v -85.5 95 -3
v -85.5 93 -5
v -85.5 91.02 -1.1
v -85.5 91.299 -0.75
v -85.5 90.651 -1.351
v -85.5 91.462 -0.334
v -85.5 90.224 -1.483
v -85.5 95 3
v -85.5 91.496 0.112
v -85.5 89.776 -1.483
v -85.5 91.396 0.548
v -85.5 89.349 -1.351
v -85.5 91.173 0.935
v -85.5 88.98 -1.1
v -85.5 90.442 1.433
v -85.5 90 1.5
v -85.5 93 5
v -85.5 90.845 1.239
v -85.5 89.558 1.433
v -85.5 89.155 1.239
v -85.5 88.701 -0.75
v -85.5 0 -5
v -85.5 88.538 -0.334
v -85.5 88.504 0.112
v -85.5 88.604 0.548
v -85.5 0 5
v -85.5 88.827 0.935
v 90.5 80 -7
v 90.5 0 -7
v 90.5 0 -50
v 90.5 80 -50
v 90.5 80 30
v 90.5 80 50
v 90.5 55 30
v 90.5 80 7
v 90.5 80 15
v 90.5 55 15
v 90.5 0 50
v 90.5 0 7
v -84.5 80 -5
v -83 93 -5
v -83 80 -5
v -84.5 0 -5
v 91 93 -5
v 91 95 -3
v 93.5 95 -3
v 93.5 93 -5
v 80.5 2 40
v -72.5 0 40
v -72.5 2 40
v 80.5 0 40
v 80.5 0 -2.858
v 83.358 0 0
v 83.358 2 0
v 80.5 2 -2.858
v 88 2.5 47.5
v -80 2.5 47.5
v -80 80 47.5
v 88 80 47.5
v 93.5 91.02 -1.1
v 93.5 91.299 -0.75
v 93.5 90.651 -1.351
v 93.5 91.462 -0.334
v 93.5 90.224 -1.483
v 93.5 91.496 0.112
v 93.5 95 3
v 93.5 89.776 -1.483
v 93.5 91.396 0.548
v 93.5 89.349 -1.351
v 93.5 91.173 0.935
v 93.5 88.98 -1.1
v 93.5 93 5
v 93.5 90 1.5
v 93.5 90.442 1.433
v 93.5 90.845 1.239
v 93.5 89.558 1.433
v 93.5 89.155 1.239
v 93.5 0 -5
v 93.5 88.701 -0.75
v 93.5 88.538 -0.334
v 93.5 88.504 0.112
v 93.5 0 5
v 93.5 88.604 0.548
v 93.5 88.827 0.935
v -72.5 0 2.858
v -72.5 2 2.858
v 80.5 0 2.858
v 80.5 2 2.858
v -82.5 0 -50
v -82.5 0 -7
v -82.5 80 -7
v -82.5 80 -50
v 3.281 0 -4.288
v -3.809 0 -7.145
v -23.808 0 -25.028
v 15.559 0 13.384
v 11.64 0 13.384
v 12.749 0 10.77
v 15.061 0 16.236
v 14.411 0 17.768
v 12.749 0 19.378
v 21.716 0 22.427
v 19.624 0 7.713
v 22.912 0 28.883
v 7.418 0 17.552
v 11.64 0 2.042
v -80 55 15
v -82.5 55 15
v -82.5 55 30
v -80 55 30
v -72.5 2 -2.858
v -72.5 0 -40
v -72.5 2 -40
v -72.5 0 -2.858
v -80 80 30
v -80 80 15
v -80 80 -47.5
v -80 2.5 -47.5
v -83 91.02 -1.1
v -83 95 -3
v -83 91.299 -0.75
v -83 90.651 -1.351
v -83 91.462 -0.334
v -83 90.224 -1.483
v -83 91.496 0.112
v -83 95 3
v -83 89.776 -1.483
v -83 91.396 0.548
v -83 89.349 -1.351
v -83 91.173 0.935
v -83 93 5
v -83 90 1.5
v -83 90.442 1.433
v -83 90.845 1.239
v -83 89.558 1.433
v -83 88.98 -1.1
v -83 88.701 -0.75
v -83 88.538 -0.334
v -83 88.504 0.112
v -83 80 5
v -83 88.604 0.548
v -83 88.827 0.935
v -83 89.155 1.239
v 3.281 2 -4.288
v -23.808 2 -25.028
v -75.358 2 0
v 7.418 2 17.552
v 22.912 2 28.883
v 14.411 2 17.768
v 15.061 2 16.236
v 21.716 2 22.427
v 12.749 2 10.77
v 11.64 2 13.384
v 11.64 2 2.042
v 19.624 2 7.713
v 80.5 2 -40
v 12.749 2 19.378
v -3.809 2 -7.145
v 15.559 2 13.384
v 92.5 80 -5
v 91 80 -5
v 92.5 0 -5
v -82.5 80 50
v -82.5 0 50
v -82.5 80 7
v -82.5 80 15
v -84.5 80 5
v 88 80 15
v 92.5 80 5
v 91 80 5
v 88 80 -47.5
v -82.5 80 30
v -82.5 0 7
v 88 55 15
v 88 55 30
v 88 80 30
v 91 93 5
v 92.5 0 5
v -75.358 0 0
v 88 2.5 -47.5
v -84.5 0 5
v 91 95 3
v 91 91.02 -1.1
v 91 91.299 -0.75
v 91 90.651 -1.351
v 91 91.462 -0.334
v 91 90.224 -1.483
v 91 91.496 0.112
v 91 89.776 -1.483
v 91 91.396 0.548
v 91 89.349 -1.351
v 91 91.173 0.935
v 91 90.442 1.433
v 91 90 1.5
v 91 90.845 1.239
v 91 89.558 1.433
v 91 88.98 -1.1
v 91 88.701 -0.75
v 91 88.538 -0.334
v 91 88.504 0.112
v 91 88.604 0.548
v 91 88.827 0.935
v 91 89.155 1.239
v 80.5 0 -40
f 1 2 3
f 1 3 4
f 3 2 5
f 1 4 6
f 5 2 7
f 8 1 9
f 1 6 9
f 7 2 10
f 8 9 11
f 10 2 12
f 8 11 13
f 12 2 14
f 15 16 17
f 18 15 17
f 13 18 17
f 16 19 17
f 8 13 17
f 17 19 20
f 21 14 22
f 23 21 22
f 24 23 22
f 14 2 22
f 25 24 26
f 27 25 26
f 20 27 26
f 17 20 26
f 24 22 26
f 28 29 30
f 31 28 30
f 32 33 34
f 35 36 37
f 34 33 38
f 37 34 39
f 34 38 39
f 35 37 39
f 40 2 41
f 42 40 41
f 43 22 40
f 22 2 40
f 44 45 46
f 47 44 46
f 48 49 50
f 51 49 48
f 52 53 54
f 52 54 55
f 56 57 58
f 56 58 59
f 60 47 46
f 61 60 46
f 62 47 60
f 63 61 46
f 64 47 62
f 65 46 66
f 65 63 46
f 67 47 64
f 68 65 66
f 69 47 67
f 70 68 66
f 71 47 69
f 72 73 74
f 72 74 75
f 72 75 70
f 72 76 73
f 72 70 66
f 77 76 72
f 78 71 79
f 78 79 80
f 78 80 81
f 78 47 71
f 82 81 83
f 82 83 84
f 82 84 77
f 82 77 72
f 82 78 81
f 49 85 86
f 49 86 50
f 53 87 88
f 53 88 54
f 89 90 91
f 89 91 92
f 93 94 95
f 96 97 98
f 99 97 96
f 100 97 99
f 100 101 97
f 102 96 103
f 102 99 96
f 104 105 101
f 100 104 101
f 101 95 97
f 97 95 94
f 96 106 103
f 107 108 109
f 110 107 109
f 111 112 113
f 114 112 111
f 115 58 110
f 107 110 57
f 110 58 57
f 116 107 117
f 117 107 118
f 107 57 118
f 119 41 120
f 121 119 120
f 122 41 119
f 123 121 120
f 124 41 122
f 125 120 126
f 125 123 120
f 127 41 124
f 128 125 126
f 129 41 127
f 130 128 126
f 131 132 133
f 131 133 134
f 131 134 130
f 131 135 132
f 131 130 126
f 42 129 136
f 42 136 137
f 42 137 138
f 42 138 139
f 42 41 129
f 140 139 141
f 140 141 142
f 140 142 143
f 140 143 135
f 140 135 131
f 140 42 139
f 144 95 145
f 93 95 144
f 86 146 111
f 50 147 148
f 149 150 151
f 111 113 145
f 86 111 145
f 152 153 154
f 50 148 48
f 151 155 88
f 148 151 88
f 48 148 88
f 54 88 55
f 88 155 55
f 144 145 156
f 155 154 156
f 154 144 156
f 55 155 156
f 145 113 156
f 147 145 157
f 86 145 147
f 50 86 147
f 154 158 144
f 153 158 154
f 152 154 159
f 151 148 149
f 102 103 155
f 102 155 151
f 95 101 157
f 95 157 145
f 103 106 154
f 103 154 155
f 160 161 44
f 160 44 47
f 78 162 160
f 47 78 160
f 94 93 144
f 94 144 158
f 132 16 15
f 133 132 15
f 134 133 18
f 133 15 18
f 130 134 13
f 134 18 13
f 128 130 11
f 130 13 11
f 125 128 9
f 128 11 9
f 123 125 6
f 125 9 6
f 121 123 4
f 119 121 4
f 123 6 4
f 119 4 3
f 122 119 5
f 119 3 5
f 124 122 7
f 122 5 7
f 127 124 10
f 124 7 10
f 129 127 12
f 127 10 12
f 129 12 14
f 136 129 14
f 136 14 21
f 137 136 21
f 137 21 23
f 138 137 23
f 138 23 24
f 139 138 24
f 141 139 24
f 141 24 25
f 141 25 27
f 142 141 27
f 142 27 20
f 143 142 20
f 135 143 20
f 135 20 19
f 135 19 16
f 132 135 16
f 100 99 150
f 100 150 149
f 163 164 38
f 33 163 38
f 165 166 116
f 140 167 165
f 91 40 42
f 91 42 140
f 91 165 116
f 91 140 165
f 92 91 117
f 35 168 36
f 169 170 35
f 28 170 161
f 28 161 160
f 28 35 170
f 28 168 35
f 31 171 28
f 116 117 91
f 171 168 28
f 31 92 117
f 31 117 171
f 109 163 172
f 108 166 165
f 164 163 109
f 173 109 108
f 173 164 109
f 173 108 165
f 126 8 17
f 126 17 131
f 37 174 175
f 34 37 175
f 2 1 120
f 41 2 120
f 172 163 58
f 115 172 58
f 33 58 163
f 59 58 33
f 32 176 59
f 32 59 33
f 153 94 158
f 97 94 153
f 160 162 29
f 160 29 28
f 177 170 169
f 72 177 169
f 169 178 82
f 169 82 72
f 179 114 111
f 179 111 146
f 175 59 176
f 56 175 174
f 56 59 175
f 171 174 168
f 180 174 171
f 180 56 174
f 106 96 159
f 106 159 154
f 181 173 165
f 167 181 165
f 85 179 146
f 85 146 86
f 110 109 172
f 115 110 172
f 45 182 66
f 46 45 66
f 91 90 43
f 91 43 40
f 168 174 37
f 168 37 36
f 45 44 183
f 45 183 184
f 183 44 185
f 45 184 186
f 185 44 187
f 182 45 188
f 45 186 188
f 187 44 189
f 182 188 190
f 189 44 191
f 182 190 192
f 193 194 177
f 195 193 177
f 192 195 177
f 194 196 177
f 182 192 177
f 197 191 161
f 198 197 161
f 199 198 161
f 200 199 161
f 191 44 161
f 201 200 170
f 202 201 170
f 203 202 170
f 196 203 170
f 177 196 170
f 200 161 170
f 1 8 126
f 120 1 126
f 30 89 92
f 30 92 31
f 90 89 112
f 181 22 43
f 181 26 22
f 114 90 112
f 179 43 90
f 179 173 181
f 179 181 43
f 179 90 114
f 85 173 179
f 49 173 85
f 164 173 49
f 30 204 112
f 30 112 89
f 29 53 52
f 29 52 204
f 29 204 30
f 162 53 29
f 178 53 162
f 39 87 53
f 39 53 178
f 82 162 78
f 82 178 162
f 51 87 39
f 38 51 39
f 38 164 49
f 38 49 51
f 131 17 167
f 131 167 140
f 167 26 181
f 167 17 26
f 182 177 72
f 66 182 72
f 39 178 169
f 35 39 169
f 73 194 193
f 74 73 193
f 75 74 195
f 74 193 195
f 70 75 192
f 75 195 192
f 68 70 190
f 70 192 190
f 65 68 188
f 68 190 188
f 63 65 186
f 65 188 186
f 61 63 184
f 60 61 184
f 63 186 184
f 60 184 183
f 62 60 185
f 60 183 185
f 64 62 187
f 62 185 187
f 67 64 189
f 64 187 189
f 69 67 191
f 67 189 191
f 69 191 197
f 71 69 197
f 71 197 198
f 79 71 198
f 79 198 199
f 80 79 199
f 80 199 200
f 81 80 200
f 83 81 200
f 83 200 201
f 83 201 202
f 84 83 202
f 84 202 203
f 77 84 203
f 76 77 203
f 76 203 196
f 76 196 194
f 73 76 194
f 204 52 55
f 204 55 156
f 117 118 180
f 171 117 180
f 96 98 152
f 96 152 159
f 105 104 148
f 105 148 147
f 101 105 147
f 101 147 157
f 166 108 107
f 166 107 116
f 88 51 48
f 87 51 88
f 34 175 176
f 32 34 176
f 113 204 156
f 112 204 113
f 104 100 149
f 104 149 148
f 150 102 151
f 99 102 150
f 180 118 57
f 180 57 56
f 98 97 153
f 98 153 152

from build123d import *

# Parameters (mm, degrees)
SKETCH1_W           = 173
SKETCH1_H           = 100
BOSS_EXTRUDE1_DEPTH = 80
SHELL2_T            = -2.5
SKETCH3_W           = 3
SKETCH3_H           = 10
BOSS_EXTRUDE2_DEPTH = 95
CHAMFER1_SIZE       = 2
MOVE_FACE1_BY       = 0.5
MOVE_FACE2_BY       = 0.5
SKETCH4_R           = 1.5
CUT_EXTRUDE1_DEPTH  = 209.724699066
CUT_EXTRUDE3_DEPTH  = 2
SKETCH6_W           = 15
SKETCH6_H           = 25
CUT_EXTRUDE4_DEPTH  = 207.157706623


# Read off the part's stored shape, not the designer's step: Cut-Extrude3
with BuildPart() as part:
    # Sketch1 → Boss-Extrude1 (new body)
    with BuildSketch(Plane(origin=(0, 0, 0), x_dir=(1, 0, 0), z_dir=(0, 1, 0))):
        with Locations((4, 0)):
            Rectangle(SKETCH1_W, SKETCH1_H)
    extrude(amount=BOSS_EXTRUDE1_DEPTH)

    # Shell2
    shell2_openings = [part.faces().sort_by_distance(p)[0] for p in [
        (4, 80, 0),
    ]]
    offset(amount=SHELL2_T, openings=shell2_openings, kind=Kind.INTERSECTION)

    # Sketch3 → Boss-Extrude2 (add)
    with BuildSketch(Plane.XZ):
        with Locations((-84, 0)):
            Rectangle(SKETCH3_W, SKETCH3_H)
        with Locations((92, 0)):
            Rectangle(SKETCH3_W, SKETCH3_H)
    extrude(amount=-BOSS_EXTRUDE2_DEPTH)

    # Chamfer1
    chamfer1_edges = [part.edges().sort_by_distance(p)[0] for p in [
        (90.5, 40, 5),
        (90.5, 40, -5),
        (-82.5, 40, -5),
        (-82.5, 40, 5),
        (92, 95, 5),
        (92, 95, -5),
        (-84, 95, -5),
        (-84, 95, 5),
    ]]
    chamfer(chamfer1_edges, length=CHAMFER1_SIZE)

    # Move Face1: a face moved inward by 0.5
    extrude(part.faces().sort_by_distance((-82.5, 87.312785388, 0))[0], amount=MOVE_FACE1_BY, dir=(-1, 0, 0), mode=Mode.SUBTRACT)

    # Move Face2: a face moved inward by 0.5
    extrude(part.faces().sort_by_distance((90.5, 87.312785388, 0))[0], amount=MOVE_FACE2_BY, dir=(1, 0, 0), mode=Mode.SUBTRACT)

    # Sketch4 → Cut-Extrude1 (cut, through all)
    with BuildSketch(Plane.ZY.offset(85.5)):
        with Locations((0, 90)):
            Circle(SKETCH4_R)
    extrude(amount=-CUT_EXTRUDE1_DEPTH, mode=Mode.SUBTRACT)

    # Cut-Extrude3 outline → Cut-Extrude3 (cut)
    with BuildSketch(Plane(origin=(0, 0, 0), x_dir=(1, 0, 0), z_dir=(0, 1, 0))):
        Polygon((80.5, 2.857864376), (80.5, 40), (-72.5, 40), (-72.5, 2.857864376), (-75.357864376, 0), (-72.5, -2.857864376), (-72.5, -40), (80.5, -40), (80.5, -2.857864376), (83.357864376, 0), align=None)
        Polygon((7.417714413, -17.552090263), (12.749188197, -19.378229604), (-23.808346413, 25.027697518), (3.280599797, 4.287723077), (-3.809085344, 7.144760372), (11.640079291, -13.383581677), (12.749188197, -10.769740582), (15.558903364, -13.383581677), (11.640079291, -2.041689211), (19.62402318, -7.712635444), (21.716364262, -22.427069466), (15.060881541, -16.235561356), (14.410666008, -17.767926727), (22.911987737, -28.883436233), align=None, mode=Mode.SUBTRACT)
    extrude(amount=CUT_EXTRUDE3_DEPTH, mode=Mode.SUBTRACT)

    # Sketch6 → Cut-Extrude4 (cut, through all)
    with BuildSketch(Plane.ZY.offset(82.5)):
        with Locations((22.5, 67.5)):
            Rectangle(SKETCH6_W, SKETCH6_H)
    extrude(amount=-CUT_EXTRUDE4_DEPTH, mode=Mode.SUBTRACT)


solid = part.part
